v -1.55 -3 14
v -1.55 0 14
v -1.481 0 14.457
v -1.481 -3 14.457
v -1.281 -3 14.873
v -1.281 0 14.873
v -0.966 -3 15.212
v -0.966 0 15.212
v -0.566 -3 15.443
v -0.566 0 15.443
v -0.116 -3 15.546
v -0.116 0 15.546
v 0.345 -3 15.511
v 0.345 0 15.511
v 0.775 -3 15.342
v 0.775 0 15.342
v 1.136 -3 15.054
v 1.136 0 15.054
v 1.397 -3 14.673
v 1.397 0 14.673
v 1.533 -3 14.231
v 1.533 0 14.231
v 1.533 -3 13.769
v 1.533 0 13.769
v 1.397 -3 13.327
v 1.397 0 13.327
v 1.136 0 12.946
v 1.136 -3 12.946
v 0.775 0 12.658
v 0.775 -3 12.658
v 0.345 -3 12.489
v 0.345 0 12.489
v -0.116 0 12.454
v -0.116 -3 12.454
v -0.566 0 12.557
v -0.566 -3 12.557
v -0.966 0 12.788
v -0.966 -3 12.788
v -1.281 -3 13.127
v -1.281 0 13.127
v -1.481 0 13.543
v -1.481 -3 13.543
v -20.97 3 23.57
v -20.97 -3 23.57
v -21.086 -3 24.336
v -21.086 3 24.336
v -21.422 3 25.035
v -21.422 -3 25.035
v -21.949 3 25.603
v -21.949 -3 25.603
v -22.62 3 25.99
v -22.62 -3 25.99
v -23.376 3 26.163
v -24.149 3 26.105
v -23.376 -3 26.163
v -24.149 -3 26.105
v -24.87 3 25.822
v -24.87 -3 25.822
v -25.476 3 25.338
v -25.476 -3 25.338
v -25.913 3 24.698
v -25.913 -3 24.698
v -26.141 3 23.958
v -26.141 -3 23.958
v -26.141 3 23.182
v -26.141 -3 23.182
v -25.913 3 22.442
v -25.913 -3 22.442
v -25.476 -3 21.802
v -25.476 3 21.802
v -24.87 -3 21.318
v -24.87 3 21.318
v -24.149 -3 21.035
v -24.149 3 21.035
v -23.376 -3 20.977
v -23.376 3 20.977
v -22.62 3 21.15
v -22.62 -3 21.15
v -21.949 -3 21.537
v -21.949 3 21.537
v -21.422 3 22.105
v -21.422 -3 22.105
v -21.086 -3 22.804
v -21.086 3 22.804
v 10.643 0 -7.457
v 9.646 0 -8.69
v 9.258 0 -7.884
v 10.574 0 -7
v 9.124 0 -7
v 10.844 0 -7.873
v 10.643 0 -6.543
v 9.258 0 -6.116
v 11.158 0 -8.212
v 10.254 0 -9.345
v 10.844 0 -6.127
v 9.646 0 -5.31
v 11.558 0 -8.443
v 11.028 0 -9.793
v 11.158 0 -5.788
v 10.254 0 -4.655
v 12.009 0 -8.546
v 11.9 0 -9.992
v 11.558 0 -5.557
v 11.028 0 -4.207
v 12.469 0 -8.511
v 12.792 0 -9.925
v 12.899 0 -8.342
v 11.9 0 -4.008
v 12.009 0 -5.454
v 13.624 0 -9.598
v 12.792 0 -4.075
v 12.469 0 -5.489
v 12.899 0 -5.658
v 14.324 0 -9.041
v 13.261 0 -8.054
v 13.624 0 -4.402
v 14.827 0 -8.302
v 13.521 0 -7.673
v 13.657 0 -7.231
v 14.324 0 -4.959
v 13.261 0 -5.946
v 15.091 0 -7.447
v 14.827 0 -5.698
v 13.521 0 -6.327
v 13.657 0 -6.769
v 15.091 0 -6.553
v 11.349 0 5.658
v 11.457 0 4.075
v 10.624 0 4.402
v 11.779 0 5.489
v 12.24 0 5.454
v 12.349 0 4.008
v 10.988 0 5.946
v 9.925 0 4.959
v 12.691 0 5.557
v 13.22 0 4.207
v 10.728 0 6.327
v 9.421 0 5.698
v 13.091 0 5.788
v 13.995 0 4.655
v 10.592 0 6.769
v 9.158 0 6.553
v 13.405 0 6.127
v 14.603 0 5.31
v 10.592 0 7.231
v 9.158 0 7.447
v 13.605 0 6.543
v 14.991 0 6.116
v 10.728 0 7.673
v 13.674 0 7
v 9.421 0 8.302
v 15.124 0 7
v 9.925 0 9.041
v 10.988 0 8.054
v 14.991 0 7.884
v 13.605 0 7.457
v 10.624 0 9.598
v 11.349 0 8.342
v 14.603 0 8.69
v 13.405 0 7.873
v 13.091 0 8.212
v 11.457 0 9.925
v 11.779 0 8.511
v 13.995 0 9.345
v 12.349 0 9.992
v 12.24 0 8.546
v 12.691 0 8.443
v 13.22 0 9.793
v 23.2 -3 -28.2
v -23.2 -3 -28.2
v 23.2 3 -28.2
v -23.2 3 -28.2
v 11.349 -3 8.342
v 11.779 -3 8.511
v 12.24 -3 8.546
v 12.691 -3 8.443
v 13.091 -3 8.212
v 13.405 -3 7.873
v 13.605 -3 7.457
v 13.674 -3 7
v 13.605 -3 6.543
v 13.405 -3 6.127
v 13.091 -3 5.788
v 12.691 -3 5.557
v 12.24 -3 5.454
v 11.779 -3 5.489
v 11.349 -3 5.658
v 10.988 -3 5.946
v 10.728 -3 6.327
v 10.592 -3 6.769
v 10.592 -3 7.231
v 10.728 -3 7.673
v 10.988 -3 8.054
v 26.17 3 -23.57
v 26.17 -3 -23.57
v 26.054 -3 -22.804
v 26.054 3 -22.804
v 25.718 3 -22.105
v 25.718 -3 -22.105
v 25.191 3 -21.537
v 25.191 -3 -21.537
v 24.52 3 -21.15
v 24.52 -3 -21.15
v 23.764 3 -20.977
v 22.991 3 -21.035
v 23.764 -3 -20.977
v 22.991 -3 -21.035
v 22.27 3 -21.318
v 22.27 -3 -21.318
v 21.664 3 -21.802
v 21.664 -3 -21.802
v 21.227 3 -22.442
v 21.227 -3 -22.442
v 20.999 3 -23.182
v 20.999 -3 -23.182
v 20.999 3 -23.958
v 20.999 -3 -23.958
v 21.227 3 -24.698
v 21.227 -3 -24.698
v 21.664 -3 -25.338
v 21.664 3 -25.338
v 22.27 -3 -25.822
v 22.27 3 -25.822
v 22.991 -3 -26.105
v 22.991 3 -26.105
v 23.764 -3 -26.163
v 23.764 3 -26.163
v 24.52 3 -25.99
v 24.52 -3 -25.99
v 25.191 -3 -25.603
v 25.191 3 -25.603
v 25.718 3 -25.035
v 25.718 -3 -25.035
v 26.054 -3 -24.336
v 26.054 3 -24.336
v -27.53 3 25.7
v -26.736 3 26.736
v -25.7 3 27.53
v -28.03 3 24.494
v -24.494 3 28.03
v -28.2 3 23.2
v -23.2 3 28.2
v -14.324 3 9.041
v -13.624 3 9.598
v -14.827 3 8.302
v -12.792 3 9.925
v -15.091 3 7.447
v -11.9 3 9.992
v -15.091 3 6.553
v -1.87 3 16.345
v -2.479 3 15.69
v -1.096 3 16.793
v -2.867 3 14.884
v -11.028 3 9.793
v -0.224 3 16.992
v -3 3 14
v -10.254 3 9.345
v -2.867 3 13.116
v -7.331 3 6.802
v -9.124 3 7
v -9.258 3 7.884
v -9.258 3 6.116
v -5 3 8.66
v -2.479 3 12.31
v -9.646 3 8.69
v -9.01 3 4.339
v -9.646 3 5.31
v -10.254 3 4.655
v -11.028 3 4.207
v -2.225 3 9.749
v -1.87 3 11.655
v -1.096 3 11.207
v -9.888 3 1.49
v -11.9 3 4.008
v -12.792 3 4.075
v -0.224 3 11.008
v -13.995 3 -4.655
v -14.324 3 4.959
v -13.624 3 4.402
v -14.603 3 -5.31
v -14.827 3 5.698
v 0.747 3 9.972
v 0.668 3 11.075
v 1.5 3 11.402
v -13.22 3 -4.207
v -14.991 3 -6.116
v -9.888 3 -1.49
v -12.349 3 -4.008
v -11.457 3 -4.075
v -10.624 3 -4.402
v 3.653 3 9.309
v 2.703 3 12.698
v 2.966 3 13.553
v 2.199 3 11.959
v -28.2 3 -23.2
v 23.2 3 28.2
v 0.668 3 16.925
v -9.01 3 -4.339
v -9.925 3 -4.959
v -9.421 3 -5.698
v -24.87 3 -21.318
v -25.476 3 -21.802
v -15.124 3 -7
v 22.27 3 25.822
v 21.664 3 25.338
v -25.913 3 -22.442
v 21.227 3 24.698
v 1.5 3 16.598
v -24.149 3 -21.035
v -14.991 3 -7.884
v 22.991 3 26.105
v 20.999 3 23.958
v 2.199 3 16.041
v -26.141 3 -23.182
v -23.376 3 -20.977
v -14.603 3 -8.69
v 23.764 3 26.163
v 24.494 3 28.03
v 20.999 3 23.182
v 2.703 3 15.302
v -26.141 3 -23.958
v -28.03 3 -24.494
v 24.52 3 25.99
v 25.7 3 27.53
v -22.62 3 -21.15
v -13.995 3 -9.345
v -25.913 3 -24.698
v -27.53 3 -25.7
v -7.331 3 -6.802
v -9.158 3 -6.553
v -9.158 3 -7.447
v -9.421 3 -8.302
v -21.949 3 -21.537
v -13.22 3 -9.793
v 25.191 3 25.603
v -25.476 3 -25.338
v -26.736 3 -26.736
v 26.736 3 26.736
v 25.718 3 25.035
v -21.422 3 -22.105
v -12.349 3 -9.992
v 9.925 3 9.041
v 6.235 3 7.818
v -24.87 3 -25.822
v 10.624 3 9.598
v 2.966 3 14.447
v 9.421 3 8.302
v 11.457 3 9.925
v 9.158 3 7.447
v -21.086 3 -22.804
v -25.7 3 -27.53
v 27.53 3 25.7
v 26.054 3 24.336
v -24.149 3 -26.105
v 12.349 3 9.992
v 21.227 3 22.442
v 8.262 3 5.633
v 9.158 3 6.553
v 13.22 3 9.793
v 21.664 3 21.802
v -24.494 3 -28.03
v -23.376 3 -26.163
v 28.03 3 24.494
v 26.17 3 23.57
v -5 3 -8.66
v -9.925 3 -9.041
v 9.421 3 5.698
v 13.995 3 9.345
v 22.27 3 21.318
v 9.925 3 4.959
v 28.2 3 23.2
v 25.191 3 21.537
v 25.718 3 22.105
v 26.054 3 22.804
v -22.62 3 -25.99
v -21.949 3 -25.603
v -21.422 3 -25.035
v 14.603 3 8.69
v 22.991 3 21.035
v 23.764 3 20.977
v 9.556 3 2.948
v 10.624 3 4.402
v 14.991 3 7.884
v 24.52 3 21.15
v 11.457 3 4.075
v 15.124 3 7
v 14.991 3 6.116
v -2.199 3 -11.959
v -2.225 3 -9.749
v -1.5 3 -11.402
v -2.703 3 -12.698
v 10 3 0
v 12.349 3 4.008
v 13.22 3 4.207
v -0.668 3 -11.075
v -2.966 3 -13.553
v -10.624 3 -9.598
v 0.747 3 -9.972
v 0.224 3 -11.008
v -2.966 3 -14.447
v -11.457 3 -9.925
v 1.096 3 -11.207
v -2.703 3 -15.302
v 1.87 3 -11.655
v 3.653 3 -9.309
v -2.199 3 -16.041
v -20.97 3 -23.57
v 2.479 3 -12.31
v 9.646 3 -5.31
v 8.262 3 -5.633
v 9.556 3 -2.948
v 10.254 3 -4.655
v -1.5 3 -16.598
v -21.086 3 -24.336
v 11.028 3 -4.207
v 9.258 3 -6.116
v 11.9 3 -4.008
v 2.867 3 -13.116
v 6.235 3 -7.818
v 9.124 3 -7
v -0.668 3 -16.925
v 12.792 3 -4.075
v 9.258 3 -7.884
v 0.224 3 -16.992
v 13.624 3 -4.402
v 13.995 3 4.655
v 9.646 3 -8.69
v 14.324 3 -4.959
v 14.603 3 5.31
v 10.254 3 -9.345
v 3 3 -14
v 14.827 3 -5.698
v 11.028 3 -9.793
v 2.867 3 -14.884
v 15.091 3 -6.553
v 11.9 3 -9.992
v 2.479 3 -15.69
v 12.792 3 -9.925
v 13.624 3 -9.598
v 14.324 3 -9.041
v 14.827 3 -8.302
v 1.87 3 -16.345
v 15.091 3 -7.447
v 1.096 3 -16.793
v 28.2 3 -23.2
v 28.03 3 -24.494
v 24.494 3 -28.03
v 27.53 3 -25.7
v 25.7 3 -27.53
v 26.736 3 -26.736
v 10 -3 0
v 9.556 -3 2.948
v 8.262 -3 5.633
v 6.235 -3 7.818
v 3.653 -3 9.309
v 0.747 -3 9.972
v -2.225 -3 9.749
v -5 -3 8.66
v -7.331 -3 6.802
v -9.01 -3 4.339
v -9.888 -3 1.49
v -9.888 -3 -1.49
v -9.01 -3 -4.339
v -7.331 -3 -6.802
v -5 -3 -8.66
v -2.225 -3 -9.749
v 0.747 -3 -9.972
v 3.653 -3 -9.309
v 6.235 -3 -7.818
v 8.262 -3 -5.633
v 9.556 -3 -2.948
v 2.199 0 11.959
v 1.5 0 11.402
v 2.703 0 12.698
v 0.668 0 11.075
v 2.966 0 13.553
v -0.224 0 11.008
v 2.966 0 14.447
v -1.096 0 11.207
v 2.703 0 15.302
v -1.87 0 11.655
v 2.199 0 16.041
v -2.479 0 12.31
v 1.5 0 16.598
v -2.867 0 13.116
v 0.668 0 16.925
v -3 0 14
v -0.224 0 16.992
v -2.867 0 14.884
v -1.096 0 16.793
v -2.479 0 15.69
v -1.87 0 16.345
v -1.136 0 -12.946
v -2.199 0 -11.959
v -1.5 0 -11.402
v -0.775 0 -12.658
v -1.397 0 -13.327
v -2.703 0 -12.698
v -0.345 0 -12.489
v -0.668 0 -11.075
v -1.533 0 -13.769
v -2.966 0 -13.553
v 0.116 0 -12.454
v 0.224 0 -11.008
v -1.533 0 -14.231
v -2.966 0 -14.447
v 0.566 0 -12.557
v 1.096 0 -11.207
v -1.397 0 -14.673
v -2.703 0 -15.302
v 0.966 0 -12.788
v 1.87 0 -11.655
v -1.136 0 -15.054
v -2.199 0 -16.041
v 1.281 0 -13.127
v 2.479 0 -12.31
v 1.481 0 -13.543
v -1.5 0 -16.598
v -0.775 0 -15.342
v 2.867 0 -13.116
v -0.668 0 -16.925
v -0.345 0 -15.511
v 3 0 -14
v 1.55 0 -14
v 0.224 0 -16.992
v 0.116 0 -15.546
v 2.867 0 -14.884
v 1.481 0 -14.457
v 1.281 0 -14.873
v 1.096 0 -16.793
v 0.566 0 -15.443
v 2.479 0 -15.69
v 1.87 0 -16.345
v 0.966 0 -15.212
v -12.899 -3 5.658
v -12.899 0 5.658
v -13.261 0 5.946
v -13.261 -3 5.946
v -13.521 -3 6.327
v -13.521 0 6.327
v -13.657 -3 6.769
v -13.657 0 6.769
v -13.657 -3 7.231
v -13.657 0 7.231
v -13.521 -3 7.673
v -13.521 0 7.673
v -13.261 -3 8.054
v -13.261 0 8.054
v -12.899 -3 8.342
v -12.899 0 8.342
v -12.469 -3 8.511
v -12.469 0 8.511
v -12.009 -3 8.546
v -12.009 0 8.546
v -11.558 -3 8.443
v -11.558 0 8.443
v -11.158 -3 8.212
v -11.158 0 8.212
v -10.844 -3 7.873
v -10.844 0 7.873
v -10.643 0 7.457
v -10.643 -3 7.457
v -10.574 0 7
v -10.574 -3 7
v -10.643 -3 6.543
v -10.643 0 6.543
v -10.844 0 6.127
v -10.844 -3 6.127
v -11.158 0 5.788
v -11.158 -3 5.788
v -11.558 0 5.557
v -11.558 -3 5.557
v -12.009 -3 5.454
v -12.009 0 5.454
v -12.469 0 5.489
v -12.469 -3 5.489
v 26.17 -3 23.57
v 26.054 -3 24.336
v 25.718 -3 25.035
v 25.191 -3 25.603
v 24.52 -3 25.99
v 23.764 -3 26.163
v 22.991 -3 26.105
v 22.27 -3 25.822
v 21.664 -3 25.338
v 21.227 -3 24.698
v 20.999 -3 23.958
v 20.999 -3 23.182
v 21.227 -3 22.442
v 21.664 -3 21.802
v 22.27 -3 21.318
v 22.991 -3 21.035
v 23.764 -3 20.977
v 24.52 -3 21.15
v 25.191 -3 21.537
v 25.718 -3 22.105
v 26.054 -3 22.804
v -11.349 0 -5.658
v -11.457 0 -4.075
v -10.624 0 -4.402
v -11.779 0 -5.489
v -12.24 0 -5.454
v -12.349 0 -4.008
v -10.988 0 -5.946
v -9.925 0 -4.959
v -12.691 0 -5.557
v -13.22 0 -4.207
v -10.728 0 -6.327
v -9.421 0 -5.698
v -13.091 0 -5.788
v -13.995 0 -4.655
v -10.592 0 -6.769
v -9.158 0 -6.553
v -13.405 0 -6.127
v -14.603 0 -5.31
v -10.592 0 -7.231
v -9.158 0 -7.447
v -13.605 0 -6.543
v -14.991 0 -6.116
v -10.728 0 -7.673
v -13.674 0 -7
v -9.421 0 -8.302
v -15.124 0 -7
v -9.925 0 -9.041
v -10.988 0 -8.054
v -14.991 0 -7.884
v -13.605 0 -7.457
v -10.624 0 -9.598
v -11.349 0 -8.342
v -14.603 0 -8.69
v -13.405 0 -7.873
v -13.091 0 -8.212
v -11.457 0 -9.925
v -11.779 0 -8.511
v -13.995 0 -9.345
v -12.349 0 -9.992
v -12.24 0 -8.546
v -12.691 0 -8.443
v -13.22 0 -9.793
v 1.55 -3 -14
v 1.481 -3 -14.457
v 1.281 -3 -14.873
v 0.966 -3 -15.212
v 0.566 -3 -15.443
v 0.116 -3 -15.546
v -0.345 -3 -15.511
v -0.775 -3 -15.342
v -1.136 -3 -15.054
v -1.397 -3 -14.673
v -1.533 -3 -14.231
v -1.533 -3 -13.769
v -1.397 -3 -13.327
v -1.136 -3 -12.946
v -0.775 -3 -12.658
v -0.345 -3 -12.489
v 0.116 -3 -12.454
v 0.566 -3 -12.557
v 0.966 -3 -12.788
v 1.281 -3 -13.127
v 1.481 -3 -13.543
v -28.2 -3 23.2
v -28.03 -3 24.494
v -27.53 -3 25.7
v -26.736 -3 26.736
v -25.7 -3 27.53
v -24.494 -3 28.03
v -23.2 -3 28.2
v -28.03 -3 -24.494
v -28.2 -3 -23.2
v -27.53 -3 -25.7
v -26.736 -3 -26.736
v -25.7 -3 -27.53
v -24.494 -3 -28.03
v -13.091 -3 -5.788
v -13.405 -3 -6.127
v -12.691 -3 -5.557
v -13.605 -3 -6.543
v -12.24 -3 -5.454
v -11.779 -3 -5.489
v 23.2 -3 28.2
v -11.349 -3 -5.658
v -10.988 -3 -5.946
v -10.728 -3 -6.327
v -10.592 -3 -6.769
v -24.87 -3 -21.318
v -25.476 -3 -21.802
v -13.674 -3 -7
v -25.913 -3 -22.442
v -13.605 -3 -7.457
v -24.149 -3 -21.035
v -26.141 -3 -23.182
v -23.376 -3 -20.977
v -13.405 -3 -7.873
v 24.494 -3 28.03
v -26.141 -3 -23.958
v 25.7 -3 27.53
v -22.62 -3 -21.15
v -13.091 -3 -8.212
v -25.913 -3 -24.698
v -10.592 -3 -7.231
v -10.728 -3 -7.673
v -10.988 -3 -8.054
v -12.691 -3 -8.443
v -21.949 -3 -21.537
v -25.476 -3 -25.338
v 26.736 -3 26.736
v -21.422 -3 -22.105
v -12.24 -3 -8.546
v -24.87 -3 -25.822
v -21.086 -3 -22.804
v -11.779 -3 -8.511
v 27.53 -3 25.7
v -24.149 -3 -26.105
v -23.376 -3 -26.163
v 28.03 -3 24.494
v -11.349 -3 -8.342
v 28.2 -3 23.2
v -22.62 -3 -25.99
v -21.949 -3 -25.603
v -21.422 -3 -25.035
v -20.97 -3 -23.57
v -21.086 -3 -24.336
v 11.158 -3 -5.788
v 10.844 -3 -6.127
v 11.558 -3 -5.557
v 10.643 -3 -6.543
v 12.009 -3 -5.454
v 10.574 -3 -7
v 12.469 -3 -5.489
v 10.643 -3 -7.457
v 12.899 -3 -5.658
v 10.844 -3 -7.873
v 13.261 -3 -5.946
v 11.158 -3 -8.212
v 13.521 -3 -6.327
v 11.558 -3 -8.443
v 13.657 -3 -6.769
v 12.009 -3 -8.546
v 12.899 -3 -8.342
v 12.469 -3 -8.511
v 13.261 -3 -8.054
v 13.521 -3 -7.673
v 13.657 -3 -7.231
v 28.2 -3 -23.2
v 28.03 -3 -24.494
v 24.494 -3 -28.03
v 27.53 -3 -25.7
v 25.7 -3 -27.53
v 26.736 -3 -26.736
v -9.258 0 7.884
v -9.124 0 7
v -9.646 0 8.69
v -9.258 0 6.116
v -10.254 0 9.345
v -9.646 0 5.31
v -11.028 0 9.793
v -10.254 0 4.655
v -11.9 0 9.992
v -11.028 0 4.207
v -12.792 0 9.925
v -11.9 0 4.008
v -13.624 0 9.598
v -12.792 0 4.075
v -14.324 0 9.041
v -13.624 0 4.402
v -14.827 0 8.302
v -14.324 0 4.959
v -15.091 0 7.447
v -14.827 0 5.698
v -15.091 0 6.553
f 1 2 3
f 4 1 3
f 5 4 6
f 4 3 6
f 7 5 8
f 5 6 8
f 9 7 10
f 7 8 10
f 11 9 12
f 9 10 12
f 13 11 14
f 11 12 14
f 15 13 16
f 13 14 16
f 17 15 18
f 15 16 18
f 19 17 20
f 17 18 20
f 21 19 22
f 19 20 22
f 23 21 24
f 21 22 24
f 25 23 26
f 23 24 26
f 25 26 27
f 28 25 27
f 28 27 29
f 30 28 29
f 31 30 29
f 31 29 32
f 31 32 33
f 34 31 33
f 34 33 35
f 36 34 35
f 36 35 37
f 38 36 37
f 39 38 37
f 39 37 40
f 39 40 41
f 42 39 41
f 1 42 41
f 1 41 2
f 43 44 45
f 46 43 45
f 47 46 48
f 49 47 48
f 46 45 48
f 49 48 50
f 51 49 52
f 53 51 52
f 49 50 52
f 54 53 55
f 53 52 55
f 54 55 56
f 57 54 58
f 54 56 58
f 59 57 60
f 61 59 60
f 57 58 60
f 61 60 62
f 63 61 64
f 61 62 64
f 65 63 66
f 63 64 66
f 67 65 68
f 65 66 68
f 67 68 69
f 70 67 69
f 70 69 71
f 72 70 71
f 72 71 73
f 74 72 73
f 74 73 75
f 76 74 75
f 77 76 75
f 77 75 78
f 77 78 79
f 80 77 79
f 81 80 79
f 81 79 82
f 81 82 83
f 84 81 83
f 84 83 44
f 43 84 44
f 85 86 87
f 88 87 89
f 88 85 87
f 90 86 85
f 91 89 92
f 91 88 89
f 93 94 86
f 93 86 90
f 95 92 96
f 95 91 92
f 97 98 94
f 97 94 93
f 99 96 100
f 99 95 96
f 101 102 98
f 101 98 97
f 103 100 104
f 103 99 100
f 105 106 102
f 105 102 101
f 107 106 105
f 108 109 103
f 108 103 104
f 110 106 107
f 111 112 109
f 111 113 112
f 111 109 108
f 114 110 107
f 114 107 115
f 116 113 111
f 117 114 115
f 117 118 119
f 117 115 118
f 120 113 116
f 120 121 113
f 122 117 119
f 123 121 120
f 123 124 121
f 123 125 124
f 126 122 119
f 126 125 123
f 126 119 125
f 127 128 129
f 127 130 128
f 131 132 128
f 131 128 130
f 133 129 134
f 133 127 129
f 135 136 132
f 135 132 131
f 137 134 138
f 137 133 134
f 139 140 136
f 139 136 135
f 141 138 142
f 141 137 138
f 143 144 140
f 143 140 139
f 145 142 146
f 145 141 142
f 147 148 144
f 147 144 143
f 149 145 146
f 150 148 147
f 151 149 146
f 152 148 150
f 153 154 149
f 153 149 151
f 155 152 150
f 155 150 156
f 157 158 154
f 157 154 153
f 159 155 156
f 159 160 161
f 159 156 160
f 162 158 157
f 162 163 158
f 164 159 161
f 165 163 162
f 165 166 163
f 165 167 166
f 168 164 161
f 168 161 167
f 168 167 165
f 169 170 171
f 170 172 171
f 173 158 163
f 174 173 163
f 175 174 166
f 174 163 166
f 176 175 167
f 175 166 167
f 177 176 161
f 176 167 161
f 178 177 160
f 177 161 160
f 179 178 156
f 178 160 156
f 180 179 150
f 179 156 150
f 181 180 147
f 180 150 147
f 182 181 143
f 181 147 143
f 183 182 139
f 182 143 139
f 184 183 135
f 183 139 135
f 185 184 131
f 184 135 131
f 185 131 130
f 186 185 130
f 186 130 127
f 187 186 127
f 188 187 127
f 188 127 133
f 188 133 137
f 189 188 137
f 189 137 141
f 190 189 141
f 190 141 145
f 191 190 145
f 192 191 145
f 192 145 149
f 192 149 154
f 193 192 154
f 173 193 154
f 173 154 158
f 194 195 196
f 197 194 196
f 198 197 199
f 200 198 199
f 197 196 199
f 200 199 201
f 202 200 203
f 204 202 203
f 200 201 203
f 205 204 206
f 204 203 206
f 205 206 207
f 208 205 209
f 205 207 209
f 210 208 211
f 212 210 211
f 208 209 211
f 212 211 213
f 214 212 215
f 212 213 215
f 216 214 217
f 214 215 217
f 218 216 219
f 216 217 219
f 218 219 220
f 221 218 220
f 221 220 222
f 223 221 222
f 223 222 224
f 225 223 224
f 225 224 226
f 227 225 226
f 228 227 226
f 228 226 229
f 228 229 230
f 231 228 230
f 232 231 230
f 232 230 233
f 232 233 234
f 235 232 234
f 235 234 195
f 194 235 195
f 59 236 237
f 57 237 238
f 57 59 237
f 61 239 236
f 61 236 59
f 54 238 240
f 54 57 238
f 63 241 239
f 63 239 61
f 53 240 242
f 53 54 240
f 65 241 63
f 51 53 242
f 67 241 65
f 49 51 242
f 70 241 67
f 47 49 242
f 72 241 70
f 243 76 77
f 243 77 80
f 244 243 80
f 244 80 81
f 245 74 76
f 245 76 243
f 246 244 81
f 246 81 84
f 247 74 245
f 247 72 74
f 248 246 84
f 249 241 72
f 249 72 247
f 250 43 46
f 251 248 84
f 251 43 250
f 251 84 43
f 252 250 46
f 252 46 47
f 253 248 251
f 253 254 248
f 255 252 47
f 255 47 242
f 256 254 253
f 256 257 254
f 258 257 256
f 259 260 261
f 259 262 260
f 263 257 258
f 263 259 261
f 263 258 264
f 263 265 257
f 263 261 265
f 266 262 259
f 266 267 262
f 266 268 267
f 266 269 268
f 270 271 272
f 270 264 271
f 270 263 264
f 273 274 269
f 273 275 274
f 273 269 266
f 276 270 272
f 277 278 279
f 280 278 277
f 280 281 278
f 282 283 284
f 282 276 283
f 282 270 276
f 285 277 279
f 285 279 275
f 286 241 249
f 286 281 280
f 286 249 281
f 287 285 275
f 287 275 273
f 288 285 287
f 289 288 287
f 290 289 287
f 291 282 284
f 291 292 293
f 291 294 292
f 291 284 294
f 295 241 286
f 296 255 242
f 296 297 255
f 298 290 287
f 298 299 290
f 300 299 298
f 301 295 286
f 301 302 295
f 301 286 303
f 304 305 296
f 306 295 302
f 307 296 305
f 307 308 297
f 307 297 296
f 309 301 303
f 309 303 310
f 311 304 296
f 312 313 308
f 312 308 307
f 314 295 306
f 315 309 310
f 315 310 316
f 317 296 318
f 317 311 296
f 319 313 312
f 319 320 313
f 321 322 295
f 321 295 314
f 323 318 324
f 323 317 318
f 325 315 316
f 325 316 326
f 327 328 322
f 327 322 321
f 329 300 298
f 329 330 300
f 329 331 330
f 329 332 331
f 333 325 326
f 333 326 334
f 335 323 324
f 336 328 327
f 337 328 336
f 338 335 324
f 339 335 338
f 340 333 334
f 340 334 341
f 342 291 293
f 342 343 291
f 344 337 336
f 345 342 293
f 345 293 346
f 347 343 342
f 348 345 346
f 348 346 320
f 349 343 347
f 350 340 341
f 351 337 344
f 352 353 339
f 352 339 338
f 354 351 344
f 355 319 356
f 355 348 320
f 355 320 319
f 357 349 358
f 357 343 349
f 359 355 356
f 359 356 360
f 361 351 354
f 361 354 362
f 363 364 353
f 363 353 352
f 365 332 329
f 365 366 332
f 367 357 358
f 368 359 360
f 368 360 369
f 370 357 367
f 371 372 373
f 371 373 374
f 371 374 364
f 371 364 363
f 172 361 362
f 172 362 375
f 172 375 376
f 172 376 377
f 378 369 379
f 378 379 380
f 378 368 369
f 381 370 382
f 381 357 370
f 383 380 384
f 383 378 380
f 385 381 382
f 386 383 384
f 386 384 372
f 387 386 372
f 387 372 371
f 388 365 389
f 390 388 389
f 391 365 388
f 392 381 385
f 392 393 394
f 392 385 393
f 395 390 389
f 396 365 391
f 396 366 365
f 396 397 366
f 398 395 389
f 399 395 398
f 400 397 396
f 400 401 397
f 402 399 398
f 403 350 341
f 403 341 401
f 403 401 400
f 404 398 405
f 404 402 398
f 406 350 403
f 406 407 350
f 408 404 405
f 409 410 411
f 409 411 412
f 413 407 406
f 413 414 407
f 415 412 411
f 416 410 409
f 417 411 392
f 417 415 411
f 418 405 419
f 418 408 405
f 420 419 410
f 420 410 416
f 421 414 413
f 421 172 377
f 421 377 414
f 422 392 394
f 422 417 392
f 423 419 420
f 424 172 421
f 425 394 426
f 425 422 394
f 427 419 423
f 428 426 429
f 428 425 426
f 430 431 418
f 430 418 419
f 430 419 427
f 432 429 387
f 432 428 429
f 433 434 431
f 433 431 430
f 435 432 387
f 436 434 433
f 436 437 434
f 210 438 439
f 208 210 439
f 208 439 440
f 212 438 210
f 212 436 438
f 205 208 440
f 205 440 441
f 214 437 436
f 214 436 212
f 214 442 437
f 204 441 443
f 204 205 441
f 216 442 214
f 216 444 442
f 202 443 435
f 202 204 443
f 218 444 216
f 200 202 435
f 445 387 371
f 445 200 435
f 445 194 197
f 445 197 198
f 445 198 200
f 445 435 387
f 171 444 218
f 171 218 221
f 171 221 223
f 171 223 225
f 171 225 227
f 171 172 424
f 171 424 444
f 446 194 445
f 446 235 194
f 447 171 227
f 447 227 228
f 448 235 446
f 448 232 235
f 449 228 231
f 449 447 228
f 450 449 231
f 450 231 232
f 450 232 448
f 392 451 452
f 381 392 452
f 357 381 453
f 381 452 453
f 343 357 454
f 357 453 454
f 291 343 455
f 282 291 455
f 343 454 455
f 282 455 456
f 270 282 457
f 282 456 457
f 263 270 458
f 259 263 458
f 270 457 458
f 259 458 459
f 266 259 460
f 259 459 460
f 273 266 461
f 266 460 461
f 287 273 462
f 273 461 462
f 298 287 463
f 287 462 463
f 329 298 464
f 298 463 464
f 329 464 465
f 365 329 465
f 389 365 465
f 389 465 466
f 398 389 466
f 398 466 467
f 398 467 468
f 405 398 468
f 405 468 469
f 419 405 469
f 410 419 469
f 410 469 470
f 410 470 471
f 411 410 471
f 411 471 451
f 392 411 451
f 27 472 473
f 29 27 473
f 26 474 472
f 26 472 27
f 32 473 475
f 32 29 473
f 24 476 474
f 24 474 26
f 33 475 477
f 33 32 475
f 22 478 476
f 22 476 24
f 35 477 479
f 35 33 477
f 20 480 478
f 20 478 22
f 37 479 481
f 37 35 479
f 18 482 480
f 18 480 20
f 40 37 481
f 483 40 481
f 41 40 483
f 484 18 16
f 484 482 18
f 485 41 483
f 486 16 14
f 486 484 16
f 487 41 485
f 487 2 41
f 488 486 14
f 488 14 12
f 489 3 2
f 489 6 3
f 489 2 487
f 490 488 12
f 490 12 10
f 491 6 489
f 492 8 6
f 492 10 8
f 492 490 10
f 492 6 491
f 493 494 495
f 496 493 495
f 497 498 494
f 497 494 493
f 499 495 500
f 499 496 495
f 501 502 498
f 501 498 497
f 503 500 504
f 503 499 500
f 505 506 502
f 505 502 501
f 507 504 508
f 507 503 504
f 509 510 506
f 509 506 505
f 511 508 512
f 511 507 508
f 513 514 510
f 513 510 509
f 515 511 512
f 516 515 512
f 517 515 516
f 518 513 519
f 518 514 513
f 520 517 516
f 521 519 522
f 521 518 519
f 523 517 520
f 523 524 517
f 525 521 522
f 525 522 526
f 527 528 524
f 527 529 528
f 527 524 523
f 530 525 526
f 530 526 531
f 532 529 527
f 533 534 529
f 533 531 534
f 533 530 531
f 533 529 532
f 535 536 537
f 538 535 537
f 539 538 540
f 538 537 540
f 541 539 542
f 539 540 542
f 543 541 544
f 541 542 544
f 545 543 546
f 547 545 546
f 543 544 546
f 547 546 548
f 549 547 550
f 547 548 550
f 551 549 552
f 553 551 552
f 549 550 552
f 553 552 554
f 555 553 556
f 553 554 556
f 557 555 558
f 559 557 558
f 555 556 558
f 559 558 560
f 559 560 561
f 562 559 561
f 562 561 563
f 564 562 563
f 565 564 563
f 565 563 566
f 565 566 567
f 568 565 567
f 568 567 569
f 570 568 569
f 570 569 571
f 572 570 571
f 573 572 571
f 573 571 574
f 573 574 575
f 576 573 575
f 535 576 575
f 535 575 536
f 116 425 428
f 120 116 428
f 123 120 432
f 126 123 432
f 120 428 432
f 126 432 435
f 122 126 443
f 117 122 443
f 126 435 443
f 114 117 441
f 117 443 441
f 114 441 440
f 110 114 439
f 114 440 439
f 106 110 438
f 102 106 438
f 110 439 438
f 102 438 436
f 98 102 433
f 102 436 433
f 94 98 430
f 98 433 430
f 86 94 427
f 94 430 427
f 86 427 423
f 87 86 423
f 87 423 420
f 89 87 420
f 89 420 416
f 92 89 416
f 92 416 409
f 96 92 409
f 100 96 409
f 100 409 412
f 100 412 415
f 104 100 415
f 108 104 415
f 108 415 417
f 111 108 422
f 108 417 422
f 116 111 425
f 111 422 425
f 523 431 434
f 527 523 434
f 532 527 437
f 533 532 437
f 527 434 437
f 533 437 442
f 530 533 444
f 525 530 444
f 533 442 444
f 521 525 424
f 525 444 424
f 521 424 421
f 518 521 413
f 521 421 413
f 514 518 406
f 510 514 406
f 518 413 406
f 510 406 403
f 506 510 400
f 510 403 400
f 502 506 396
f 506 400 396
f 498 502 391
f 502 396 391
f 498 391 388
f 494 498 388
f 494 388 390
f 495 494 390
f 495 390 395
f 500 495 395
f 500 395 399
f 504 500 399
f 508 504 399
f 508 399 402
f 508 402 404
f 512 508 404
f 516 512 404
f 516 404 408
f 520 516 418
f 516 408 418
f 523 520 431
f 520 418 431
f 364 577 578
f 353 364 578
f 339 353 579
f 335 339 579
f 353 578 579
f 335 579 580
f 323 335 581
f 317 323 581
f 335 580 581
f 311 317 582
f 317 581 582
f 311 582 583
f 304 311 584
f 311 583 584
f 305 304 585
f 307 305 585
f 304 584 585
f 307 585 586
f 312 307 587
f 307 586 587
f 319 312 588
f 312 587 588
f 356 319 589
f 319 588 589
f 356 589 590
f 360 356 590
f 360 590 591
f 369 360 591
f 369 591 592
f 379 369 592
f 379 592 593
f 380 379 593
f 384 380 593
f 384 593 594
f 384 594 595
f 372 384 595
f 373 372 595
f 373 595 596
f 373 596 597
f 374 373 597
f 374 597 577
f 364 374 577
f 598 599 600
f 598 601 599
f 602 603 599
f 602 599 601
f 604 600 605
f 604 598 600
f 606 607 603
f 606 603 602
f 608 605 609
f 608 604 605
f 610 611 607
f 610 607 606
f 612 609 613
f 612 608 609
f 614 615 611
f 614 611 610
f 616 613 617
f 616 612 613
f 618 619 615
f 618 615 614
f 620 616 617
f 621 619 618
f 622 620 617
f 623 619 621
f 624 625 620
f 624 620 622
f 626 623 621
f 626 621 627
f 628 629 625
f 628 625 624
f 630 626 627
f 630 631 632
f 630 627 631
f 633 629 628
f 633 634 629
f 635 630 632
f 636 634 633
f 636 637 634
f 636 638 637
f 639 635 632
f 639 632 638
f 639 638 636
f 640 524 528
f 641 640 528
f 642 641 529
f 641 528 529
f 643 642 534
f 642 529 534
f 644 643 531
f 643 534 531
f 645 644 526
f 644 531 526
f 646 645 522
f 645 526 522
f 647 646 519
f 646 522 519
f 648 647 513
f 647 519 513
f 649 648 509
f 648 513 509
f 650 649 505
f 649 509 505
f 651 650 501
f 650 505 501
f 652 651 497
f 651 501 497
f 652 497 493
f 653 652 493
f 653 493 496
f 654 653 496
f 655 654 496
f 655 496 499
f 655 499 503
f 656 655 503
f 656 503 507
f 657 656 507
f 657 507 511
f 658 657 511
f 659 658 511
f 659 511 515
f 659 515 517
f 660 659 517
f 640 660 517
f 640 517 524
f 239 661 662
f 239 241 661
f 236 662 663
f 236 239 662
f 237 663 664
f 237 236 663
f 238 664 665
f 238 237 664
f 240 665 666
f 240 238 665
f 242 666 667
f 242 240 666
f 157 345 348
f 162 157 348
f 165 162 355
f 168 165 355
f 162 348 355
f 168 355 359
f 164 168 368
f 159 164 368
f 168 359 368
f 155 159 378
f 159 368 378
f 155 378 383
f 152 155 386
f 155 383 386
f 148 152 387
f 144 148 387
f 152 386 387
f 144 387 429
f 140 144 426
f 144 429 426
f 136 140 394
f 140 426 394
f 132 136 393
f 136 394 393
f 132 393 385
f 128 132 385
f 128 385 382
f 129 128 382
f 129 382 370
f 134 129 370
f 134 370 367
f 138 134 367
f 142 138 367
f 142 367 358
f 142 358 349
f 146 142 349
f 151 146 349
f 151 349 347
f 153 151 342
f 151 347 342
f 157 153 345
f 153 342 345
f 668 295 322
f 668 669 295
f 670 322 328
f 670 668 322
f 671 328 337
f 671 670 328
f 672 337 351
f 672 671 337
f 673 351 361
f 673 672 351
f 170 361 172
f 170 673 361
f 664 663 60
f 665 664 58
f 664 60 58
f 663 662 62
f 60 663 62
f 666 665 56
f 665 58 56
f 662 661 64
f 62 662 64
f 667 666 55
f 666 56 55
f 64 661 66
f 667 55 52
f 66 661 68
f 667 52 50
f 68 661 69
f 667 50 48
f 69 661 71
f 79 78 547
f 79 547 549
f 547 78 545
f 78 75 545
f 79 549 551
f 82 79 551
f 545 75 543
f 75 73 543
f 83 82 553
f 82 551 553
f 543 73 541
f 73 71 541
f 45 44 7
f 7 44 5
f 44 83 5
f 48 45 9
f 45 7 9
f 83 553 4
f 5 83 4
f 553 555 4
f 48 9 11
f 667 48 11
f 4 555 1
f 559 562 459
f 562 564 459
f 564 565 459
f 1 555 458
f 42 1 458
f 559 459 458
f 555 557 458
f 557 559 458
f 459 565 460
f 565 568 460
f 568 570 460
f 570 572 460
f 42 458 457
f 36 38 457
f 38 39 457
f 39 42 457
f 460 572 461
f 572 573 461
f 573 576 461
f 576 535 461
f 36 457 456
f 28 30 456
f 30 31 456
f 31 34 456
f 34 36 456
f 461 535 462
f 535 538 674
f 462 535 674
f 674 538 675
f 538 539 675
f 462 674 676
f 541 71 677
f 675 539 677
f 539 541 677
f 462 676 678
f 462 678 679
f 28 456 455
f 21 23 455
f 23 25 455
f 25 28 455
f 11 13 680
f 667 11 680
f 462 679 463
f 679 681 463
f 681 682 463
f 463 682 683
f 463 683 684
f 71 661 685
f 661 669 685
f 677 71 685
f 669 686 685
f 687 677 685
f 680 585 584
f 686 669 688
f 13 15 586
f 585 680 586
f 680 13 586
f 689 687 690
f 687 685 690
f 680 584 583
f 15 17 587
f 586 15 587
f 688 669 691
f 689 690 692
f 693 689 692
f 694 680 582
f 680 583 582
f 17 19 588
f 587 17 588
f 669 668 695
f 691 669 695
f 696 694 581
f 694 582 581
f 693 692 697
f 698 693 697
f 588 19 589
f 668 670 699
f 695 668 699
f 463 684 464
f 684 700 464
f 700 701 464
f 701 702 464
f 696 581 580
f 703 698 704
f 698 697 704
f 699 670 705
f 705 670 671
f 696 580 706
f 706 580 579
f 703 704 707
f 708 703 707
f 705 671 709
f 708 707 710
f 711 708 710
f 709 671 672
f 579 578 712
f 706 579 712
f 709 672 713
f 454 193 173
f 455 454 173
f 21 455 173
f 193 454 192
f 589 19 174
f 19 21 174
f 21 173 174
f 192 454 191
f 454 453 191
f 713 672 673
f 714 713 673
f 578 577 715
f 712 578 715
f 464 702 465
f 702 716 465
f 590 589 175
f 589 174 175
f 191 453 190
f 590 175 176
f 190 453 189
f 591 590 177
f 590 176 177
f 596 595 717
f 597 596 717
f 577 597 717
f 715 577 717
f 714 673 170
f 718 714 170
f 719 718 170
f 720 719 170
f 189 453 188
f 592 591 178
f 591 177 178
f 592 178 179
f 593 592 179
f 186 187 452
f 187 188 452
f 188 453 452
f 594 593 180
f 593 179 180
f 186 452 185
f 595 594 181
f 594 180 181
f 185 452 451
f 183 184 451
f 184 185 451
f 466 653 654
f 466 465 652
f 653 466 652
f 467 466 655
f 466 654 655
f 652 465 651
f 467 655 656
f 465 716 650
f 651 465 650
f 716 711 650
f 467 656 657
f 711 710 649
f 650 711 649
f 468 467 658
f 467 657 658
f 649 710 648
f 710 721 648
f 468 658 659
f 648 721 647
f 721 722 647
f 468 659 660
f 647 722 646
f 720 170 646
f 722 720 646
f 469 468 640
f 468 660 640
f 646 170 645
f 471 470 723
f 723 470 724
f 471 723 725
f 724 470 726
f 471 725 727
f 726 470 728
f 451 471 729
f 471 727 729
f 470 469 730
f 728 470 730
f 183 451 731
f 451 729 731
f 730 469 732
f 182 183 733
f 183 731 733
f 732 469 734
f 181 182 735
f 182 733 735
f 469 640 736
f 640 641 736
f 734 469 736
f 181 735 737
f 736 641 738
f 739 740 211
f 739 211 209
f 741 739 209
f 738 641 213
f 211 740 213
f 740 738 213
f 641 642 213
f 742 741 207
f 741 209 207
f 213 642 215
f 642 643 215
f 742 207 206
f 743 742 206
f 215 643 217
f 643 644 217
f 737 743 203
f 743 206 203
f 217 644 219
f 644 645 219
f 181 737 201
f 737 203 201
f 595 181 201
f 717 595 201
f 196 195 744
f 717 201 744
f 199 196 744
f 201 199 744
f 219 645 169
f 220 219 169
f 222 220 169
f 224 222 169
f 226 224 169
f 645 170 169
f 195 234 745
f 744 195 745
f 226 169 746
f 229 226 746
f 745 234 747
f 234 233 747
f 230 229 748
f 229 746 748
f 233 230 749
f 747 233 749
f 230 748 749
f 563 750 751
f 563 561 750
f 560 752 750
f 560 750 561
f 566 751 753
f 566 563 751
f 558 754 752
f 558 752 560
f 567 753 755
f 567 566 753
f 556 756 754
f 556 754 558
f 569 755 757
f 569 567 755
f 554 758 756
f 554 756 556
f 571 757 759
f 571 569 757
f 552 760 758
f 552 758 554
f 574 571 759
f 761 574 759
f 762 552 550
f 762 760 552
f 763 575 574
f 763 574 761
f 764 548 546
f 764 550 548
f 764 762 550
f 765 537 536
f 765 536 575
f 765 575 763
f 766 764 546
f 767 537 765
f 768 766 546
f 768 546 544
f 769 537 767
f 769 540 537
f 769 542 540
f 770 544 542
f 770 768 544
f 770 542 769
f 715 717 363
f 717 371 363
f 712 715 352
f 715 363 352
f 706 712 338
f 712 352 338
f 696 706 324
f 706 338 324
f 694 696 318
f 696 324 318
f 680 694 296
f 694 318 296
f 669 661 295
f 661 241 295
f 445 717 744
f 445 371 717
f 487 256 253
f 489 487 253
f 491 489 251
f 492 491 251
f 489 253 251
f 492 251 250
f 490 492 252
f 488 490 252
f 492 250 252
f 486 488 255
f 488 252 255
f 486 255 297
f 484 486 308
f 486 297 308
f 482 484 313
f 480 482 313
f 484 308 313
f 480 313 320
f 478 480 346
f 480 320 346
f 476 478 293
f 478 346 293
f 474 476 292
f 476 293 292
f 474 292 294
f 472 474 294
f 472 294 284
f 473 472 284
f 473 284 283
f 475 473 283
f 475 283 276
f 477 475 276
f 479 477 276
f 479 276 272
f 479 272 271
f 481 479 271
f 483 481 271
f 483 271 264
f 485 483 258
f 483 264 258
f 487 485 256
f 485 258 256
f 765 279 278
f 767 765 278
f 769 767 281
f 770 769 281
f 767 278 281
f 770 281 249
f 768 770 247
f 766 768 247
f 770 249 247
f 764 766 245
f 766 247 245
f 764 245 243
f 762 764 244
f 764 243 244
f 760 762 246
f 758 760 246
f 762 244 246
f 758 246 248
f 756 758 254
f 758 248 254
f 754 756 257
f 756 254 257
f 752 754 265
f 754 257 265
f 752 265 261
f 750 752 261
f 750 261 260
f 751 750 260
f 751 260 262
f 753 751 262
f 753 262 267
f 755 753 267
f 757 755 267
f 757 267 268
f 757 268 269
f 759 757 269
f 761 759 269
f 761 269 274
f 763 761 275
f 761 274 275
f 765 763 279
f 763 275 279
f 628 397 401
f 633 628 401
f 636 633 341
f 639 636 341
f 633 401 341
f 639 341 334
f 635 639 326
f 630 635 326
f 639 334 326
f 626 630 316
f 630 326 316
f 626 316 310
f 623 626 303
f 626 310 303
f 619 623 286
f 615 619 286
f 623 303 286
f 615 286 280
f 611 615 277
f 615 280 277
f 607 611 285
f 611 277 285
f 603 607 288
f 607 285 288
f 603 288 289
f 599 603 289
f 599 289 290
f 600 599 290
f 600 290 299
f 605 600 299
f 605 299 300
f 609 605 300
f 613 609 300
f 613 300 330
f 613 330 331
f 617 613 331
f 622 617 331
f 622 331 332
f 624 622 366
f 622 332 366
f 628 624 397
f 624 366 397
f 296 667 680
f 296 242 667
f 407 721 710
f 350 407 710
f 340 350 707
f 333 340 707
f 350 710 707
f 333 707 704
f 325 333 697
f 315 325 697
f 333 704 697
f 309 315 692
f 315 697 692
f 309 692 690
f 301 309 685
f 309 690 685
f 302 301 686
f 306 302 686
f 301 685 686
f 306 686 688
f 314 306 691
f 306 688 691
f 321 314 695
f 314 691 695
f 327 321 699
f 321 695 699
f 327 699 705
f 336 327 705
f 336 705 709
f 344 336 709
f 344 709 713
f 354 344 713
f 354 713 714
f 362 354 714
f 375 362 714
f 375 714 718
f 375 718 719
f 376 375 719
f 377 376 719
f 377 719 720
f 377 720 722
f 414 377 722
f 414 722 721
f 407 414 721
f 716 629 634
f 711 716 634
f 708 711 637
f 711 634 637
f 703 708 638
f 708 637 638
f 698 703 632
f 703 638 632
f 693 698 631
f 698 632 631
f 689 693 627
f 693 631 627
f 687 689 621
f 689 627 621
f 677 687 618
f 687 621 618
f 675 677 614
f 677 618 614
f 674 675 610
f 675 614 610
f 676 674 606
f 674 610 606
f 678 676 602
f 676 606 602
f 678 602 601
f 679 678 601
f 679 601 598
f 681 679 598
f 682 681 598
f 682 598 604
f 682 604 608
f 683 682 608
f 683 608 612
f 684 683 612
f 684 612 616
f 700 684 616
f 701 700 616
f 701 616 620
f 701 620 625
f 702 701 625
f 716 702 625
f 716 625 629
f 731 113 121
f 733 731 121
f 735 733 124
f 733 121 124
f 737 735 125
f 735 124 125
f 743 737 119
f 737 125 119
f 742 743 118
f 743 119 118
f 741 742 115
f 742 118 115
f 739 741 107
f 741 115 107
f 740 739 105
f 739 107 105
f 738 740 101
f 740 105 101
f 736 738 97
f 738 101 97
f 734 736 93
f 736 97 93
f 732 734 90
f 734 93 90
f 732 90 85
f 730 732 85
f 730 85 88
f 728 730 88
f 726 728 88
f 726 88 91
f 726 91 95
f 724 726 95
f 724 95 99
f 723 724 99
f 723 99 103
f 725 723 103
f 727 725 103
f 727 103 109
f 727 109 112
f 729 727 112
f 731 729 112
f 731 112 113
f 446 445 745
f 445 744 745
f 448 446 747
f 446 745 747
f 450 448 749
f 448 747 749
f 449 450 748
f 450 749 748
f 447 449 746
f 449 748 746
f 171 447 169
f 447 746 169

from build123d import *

# Parameters (mm, degrees)
SKETCH1_W           = 56.4
SKETCH1_H           = 56.4
BOSS_EXTRUDE1_DEPTH = 3
FILLET1_R           = 5
SKETCH2_R           = 2.6
CUT_EXTRUDE1_DEPTH  = 7
SKETCH4_R           = 10
CUT_EXTRUDE3_DEPTH  = 7
SKETCH5_R           = 1.55
CUT_EXTRUDE4_DEPTH  = 7
SKETCH6_R           = 3
CUT_EXTRUDE5_DEPTH  = 3
CIRPATTERN1_COUNT   = 6


with BuildPart() as part:
    # Sketch1 → Boss-Extrude1 (new body, symmetric)
    with BuildSketch(Plane(origin=(0, 0, 0), x_dir=(1, 0, 0), z_dir=(0, 1, 0))):
        Rectangle(SKETCH1_W, SKETCH1_H)
    extrude(amount=BOSS_EXTRUDE1_DEPTH, both=True)

    # Fillet1
    fillet1_edges = [part.edges().sort_by_distance(p)[0] for p in [
        (28.2, 0, 28.2),
        (-28.2, 0, 28.2),
        (-28.2, 0, -28.2),
        (28.2, 0, -28.2),
    ]]
    fillet(fillet1_edges, radius=FILLET1_R)

    # Sketch2 → Cut-Extrude1 (cut, through all)
    with BuildSketch(Plane.XZ.offset(3)):
        with Locations((-23.57, 23.57)):
            Circle(SKETCH2_R)
        with Locations((23.57, 23.57)):
            Circle(SKETCH2_R)
        with Locations((23.57, -23.57)):
            Circle(SKETCH2_R)
        with Locations((-23.57, -23.57)):
            Circle(SKETCH2_R)
    extrude(amount=-CUT_EXTRUDE1_DEPTH, mode=Mode.SUBTRACT)

    # Sketch4 → Cut-Extrude3 (cut, through all)
    with BuildSketch(Plane.XZ.offset(3)):
        Circle(SKETCH4_R)
    extrude(amount=-CUT_EXTRUDE3_DEPTH, mode=Mode.SUBTRACT)

    # Sketch5 → Cut-Extrude4 (cut, through all)
    with BuildSketch(Plane(origin=(0, 3, 0), x_dir=(1, 0, 0), z_dir=(0, 1, 0))):
        with Locations((0, 14)):
            Circle(SKETCH5_R)
    cut_extrude4 = extrude(amount=-CUT_EXTRUDE4_DEPTH, mode=Mode.SUBTRACT)

    # Sketch6 → Cut-Extrude5 (cut)
    with BuildSketch(Plane(origin=(0, 3, 0), x_dir=(1, 0, 0), z_dir=(0, 1, 0))):
        with Locations((0, 14)):
            Circle(SKETCH6_R)
    cut_extrude5 = extrude(amount=-CUT_EXTRUDE5_DEPTH, mode=Mode.SUBTRACT)

    # CirPattern1: Cut-Extrude4, Cut-Extrude5 ×6 about axis
    cirpattern1_axis = Axis((0, 0, 0), (0, 1, 0))
    for i in range(1, CIRPATTERN1_COUNT):
        add(cut_extrude4.rotate(cirpattern1_axis, i * 360 / CIRPATTERN1_COUNT), mode=Mode.SUBTRACT)
        add(cut_extrude5.rotate(cirpattern1_axis, i * 360 / CIRPATTERN1_COUNT), mode=Mode.SUBTRACT)


solid = part.part
